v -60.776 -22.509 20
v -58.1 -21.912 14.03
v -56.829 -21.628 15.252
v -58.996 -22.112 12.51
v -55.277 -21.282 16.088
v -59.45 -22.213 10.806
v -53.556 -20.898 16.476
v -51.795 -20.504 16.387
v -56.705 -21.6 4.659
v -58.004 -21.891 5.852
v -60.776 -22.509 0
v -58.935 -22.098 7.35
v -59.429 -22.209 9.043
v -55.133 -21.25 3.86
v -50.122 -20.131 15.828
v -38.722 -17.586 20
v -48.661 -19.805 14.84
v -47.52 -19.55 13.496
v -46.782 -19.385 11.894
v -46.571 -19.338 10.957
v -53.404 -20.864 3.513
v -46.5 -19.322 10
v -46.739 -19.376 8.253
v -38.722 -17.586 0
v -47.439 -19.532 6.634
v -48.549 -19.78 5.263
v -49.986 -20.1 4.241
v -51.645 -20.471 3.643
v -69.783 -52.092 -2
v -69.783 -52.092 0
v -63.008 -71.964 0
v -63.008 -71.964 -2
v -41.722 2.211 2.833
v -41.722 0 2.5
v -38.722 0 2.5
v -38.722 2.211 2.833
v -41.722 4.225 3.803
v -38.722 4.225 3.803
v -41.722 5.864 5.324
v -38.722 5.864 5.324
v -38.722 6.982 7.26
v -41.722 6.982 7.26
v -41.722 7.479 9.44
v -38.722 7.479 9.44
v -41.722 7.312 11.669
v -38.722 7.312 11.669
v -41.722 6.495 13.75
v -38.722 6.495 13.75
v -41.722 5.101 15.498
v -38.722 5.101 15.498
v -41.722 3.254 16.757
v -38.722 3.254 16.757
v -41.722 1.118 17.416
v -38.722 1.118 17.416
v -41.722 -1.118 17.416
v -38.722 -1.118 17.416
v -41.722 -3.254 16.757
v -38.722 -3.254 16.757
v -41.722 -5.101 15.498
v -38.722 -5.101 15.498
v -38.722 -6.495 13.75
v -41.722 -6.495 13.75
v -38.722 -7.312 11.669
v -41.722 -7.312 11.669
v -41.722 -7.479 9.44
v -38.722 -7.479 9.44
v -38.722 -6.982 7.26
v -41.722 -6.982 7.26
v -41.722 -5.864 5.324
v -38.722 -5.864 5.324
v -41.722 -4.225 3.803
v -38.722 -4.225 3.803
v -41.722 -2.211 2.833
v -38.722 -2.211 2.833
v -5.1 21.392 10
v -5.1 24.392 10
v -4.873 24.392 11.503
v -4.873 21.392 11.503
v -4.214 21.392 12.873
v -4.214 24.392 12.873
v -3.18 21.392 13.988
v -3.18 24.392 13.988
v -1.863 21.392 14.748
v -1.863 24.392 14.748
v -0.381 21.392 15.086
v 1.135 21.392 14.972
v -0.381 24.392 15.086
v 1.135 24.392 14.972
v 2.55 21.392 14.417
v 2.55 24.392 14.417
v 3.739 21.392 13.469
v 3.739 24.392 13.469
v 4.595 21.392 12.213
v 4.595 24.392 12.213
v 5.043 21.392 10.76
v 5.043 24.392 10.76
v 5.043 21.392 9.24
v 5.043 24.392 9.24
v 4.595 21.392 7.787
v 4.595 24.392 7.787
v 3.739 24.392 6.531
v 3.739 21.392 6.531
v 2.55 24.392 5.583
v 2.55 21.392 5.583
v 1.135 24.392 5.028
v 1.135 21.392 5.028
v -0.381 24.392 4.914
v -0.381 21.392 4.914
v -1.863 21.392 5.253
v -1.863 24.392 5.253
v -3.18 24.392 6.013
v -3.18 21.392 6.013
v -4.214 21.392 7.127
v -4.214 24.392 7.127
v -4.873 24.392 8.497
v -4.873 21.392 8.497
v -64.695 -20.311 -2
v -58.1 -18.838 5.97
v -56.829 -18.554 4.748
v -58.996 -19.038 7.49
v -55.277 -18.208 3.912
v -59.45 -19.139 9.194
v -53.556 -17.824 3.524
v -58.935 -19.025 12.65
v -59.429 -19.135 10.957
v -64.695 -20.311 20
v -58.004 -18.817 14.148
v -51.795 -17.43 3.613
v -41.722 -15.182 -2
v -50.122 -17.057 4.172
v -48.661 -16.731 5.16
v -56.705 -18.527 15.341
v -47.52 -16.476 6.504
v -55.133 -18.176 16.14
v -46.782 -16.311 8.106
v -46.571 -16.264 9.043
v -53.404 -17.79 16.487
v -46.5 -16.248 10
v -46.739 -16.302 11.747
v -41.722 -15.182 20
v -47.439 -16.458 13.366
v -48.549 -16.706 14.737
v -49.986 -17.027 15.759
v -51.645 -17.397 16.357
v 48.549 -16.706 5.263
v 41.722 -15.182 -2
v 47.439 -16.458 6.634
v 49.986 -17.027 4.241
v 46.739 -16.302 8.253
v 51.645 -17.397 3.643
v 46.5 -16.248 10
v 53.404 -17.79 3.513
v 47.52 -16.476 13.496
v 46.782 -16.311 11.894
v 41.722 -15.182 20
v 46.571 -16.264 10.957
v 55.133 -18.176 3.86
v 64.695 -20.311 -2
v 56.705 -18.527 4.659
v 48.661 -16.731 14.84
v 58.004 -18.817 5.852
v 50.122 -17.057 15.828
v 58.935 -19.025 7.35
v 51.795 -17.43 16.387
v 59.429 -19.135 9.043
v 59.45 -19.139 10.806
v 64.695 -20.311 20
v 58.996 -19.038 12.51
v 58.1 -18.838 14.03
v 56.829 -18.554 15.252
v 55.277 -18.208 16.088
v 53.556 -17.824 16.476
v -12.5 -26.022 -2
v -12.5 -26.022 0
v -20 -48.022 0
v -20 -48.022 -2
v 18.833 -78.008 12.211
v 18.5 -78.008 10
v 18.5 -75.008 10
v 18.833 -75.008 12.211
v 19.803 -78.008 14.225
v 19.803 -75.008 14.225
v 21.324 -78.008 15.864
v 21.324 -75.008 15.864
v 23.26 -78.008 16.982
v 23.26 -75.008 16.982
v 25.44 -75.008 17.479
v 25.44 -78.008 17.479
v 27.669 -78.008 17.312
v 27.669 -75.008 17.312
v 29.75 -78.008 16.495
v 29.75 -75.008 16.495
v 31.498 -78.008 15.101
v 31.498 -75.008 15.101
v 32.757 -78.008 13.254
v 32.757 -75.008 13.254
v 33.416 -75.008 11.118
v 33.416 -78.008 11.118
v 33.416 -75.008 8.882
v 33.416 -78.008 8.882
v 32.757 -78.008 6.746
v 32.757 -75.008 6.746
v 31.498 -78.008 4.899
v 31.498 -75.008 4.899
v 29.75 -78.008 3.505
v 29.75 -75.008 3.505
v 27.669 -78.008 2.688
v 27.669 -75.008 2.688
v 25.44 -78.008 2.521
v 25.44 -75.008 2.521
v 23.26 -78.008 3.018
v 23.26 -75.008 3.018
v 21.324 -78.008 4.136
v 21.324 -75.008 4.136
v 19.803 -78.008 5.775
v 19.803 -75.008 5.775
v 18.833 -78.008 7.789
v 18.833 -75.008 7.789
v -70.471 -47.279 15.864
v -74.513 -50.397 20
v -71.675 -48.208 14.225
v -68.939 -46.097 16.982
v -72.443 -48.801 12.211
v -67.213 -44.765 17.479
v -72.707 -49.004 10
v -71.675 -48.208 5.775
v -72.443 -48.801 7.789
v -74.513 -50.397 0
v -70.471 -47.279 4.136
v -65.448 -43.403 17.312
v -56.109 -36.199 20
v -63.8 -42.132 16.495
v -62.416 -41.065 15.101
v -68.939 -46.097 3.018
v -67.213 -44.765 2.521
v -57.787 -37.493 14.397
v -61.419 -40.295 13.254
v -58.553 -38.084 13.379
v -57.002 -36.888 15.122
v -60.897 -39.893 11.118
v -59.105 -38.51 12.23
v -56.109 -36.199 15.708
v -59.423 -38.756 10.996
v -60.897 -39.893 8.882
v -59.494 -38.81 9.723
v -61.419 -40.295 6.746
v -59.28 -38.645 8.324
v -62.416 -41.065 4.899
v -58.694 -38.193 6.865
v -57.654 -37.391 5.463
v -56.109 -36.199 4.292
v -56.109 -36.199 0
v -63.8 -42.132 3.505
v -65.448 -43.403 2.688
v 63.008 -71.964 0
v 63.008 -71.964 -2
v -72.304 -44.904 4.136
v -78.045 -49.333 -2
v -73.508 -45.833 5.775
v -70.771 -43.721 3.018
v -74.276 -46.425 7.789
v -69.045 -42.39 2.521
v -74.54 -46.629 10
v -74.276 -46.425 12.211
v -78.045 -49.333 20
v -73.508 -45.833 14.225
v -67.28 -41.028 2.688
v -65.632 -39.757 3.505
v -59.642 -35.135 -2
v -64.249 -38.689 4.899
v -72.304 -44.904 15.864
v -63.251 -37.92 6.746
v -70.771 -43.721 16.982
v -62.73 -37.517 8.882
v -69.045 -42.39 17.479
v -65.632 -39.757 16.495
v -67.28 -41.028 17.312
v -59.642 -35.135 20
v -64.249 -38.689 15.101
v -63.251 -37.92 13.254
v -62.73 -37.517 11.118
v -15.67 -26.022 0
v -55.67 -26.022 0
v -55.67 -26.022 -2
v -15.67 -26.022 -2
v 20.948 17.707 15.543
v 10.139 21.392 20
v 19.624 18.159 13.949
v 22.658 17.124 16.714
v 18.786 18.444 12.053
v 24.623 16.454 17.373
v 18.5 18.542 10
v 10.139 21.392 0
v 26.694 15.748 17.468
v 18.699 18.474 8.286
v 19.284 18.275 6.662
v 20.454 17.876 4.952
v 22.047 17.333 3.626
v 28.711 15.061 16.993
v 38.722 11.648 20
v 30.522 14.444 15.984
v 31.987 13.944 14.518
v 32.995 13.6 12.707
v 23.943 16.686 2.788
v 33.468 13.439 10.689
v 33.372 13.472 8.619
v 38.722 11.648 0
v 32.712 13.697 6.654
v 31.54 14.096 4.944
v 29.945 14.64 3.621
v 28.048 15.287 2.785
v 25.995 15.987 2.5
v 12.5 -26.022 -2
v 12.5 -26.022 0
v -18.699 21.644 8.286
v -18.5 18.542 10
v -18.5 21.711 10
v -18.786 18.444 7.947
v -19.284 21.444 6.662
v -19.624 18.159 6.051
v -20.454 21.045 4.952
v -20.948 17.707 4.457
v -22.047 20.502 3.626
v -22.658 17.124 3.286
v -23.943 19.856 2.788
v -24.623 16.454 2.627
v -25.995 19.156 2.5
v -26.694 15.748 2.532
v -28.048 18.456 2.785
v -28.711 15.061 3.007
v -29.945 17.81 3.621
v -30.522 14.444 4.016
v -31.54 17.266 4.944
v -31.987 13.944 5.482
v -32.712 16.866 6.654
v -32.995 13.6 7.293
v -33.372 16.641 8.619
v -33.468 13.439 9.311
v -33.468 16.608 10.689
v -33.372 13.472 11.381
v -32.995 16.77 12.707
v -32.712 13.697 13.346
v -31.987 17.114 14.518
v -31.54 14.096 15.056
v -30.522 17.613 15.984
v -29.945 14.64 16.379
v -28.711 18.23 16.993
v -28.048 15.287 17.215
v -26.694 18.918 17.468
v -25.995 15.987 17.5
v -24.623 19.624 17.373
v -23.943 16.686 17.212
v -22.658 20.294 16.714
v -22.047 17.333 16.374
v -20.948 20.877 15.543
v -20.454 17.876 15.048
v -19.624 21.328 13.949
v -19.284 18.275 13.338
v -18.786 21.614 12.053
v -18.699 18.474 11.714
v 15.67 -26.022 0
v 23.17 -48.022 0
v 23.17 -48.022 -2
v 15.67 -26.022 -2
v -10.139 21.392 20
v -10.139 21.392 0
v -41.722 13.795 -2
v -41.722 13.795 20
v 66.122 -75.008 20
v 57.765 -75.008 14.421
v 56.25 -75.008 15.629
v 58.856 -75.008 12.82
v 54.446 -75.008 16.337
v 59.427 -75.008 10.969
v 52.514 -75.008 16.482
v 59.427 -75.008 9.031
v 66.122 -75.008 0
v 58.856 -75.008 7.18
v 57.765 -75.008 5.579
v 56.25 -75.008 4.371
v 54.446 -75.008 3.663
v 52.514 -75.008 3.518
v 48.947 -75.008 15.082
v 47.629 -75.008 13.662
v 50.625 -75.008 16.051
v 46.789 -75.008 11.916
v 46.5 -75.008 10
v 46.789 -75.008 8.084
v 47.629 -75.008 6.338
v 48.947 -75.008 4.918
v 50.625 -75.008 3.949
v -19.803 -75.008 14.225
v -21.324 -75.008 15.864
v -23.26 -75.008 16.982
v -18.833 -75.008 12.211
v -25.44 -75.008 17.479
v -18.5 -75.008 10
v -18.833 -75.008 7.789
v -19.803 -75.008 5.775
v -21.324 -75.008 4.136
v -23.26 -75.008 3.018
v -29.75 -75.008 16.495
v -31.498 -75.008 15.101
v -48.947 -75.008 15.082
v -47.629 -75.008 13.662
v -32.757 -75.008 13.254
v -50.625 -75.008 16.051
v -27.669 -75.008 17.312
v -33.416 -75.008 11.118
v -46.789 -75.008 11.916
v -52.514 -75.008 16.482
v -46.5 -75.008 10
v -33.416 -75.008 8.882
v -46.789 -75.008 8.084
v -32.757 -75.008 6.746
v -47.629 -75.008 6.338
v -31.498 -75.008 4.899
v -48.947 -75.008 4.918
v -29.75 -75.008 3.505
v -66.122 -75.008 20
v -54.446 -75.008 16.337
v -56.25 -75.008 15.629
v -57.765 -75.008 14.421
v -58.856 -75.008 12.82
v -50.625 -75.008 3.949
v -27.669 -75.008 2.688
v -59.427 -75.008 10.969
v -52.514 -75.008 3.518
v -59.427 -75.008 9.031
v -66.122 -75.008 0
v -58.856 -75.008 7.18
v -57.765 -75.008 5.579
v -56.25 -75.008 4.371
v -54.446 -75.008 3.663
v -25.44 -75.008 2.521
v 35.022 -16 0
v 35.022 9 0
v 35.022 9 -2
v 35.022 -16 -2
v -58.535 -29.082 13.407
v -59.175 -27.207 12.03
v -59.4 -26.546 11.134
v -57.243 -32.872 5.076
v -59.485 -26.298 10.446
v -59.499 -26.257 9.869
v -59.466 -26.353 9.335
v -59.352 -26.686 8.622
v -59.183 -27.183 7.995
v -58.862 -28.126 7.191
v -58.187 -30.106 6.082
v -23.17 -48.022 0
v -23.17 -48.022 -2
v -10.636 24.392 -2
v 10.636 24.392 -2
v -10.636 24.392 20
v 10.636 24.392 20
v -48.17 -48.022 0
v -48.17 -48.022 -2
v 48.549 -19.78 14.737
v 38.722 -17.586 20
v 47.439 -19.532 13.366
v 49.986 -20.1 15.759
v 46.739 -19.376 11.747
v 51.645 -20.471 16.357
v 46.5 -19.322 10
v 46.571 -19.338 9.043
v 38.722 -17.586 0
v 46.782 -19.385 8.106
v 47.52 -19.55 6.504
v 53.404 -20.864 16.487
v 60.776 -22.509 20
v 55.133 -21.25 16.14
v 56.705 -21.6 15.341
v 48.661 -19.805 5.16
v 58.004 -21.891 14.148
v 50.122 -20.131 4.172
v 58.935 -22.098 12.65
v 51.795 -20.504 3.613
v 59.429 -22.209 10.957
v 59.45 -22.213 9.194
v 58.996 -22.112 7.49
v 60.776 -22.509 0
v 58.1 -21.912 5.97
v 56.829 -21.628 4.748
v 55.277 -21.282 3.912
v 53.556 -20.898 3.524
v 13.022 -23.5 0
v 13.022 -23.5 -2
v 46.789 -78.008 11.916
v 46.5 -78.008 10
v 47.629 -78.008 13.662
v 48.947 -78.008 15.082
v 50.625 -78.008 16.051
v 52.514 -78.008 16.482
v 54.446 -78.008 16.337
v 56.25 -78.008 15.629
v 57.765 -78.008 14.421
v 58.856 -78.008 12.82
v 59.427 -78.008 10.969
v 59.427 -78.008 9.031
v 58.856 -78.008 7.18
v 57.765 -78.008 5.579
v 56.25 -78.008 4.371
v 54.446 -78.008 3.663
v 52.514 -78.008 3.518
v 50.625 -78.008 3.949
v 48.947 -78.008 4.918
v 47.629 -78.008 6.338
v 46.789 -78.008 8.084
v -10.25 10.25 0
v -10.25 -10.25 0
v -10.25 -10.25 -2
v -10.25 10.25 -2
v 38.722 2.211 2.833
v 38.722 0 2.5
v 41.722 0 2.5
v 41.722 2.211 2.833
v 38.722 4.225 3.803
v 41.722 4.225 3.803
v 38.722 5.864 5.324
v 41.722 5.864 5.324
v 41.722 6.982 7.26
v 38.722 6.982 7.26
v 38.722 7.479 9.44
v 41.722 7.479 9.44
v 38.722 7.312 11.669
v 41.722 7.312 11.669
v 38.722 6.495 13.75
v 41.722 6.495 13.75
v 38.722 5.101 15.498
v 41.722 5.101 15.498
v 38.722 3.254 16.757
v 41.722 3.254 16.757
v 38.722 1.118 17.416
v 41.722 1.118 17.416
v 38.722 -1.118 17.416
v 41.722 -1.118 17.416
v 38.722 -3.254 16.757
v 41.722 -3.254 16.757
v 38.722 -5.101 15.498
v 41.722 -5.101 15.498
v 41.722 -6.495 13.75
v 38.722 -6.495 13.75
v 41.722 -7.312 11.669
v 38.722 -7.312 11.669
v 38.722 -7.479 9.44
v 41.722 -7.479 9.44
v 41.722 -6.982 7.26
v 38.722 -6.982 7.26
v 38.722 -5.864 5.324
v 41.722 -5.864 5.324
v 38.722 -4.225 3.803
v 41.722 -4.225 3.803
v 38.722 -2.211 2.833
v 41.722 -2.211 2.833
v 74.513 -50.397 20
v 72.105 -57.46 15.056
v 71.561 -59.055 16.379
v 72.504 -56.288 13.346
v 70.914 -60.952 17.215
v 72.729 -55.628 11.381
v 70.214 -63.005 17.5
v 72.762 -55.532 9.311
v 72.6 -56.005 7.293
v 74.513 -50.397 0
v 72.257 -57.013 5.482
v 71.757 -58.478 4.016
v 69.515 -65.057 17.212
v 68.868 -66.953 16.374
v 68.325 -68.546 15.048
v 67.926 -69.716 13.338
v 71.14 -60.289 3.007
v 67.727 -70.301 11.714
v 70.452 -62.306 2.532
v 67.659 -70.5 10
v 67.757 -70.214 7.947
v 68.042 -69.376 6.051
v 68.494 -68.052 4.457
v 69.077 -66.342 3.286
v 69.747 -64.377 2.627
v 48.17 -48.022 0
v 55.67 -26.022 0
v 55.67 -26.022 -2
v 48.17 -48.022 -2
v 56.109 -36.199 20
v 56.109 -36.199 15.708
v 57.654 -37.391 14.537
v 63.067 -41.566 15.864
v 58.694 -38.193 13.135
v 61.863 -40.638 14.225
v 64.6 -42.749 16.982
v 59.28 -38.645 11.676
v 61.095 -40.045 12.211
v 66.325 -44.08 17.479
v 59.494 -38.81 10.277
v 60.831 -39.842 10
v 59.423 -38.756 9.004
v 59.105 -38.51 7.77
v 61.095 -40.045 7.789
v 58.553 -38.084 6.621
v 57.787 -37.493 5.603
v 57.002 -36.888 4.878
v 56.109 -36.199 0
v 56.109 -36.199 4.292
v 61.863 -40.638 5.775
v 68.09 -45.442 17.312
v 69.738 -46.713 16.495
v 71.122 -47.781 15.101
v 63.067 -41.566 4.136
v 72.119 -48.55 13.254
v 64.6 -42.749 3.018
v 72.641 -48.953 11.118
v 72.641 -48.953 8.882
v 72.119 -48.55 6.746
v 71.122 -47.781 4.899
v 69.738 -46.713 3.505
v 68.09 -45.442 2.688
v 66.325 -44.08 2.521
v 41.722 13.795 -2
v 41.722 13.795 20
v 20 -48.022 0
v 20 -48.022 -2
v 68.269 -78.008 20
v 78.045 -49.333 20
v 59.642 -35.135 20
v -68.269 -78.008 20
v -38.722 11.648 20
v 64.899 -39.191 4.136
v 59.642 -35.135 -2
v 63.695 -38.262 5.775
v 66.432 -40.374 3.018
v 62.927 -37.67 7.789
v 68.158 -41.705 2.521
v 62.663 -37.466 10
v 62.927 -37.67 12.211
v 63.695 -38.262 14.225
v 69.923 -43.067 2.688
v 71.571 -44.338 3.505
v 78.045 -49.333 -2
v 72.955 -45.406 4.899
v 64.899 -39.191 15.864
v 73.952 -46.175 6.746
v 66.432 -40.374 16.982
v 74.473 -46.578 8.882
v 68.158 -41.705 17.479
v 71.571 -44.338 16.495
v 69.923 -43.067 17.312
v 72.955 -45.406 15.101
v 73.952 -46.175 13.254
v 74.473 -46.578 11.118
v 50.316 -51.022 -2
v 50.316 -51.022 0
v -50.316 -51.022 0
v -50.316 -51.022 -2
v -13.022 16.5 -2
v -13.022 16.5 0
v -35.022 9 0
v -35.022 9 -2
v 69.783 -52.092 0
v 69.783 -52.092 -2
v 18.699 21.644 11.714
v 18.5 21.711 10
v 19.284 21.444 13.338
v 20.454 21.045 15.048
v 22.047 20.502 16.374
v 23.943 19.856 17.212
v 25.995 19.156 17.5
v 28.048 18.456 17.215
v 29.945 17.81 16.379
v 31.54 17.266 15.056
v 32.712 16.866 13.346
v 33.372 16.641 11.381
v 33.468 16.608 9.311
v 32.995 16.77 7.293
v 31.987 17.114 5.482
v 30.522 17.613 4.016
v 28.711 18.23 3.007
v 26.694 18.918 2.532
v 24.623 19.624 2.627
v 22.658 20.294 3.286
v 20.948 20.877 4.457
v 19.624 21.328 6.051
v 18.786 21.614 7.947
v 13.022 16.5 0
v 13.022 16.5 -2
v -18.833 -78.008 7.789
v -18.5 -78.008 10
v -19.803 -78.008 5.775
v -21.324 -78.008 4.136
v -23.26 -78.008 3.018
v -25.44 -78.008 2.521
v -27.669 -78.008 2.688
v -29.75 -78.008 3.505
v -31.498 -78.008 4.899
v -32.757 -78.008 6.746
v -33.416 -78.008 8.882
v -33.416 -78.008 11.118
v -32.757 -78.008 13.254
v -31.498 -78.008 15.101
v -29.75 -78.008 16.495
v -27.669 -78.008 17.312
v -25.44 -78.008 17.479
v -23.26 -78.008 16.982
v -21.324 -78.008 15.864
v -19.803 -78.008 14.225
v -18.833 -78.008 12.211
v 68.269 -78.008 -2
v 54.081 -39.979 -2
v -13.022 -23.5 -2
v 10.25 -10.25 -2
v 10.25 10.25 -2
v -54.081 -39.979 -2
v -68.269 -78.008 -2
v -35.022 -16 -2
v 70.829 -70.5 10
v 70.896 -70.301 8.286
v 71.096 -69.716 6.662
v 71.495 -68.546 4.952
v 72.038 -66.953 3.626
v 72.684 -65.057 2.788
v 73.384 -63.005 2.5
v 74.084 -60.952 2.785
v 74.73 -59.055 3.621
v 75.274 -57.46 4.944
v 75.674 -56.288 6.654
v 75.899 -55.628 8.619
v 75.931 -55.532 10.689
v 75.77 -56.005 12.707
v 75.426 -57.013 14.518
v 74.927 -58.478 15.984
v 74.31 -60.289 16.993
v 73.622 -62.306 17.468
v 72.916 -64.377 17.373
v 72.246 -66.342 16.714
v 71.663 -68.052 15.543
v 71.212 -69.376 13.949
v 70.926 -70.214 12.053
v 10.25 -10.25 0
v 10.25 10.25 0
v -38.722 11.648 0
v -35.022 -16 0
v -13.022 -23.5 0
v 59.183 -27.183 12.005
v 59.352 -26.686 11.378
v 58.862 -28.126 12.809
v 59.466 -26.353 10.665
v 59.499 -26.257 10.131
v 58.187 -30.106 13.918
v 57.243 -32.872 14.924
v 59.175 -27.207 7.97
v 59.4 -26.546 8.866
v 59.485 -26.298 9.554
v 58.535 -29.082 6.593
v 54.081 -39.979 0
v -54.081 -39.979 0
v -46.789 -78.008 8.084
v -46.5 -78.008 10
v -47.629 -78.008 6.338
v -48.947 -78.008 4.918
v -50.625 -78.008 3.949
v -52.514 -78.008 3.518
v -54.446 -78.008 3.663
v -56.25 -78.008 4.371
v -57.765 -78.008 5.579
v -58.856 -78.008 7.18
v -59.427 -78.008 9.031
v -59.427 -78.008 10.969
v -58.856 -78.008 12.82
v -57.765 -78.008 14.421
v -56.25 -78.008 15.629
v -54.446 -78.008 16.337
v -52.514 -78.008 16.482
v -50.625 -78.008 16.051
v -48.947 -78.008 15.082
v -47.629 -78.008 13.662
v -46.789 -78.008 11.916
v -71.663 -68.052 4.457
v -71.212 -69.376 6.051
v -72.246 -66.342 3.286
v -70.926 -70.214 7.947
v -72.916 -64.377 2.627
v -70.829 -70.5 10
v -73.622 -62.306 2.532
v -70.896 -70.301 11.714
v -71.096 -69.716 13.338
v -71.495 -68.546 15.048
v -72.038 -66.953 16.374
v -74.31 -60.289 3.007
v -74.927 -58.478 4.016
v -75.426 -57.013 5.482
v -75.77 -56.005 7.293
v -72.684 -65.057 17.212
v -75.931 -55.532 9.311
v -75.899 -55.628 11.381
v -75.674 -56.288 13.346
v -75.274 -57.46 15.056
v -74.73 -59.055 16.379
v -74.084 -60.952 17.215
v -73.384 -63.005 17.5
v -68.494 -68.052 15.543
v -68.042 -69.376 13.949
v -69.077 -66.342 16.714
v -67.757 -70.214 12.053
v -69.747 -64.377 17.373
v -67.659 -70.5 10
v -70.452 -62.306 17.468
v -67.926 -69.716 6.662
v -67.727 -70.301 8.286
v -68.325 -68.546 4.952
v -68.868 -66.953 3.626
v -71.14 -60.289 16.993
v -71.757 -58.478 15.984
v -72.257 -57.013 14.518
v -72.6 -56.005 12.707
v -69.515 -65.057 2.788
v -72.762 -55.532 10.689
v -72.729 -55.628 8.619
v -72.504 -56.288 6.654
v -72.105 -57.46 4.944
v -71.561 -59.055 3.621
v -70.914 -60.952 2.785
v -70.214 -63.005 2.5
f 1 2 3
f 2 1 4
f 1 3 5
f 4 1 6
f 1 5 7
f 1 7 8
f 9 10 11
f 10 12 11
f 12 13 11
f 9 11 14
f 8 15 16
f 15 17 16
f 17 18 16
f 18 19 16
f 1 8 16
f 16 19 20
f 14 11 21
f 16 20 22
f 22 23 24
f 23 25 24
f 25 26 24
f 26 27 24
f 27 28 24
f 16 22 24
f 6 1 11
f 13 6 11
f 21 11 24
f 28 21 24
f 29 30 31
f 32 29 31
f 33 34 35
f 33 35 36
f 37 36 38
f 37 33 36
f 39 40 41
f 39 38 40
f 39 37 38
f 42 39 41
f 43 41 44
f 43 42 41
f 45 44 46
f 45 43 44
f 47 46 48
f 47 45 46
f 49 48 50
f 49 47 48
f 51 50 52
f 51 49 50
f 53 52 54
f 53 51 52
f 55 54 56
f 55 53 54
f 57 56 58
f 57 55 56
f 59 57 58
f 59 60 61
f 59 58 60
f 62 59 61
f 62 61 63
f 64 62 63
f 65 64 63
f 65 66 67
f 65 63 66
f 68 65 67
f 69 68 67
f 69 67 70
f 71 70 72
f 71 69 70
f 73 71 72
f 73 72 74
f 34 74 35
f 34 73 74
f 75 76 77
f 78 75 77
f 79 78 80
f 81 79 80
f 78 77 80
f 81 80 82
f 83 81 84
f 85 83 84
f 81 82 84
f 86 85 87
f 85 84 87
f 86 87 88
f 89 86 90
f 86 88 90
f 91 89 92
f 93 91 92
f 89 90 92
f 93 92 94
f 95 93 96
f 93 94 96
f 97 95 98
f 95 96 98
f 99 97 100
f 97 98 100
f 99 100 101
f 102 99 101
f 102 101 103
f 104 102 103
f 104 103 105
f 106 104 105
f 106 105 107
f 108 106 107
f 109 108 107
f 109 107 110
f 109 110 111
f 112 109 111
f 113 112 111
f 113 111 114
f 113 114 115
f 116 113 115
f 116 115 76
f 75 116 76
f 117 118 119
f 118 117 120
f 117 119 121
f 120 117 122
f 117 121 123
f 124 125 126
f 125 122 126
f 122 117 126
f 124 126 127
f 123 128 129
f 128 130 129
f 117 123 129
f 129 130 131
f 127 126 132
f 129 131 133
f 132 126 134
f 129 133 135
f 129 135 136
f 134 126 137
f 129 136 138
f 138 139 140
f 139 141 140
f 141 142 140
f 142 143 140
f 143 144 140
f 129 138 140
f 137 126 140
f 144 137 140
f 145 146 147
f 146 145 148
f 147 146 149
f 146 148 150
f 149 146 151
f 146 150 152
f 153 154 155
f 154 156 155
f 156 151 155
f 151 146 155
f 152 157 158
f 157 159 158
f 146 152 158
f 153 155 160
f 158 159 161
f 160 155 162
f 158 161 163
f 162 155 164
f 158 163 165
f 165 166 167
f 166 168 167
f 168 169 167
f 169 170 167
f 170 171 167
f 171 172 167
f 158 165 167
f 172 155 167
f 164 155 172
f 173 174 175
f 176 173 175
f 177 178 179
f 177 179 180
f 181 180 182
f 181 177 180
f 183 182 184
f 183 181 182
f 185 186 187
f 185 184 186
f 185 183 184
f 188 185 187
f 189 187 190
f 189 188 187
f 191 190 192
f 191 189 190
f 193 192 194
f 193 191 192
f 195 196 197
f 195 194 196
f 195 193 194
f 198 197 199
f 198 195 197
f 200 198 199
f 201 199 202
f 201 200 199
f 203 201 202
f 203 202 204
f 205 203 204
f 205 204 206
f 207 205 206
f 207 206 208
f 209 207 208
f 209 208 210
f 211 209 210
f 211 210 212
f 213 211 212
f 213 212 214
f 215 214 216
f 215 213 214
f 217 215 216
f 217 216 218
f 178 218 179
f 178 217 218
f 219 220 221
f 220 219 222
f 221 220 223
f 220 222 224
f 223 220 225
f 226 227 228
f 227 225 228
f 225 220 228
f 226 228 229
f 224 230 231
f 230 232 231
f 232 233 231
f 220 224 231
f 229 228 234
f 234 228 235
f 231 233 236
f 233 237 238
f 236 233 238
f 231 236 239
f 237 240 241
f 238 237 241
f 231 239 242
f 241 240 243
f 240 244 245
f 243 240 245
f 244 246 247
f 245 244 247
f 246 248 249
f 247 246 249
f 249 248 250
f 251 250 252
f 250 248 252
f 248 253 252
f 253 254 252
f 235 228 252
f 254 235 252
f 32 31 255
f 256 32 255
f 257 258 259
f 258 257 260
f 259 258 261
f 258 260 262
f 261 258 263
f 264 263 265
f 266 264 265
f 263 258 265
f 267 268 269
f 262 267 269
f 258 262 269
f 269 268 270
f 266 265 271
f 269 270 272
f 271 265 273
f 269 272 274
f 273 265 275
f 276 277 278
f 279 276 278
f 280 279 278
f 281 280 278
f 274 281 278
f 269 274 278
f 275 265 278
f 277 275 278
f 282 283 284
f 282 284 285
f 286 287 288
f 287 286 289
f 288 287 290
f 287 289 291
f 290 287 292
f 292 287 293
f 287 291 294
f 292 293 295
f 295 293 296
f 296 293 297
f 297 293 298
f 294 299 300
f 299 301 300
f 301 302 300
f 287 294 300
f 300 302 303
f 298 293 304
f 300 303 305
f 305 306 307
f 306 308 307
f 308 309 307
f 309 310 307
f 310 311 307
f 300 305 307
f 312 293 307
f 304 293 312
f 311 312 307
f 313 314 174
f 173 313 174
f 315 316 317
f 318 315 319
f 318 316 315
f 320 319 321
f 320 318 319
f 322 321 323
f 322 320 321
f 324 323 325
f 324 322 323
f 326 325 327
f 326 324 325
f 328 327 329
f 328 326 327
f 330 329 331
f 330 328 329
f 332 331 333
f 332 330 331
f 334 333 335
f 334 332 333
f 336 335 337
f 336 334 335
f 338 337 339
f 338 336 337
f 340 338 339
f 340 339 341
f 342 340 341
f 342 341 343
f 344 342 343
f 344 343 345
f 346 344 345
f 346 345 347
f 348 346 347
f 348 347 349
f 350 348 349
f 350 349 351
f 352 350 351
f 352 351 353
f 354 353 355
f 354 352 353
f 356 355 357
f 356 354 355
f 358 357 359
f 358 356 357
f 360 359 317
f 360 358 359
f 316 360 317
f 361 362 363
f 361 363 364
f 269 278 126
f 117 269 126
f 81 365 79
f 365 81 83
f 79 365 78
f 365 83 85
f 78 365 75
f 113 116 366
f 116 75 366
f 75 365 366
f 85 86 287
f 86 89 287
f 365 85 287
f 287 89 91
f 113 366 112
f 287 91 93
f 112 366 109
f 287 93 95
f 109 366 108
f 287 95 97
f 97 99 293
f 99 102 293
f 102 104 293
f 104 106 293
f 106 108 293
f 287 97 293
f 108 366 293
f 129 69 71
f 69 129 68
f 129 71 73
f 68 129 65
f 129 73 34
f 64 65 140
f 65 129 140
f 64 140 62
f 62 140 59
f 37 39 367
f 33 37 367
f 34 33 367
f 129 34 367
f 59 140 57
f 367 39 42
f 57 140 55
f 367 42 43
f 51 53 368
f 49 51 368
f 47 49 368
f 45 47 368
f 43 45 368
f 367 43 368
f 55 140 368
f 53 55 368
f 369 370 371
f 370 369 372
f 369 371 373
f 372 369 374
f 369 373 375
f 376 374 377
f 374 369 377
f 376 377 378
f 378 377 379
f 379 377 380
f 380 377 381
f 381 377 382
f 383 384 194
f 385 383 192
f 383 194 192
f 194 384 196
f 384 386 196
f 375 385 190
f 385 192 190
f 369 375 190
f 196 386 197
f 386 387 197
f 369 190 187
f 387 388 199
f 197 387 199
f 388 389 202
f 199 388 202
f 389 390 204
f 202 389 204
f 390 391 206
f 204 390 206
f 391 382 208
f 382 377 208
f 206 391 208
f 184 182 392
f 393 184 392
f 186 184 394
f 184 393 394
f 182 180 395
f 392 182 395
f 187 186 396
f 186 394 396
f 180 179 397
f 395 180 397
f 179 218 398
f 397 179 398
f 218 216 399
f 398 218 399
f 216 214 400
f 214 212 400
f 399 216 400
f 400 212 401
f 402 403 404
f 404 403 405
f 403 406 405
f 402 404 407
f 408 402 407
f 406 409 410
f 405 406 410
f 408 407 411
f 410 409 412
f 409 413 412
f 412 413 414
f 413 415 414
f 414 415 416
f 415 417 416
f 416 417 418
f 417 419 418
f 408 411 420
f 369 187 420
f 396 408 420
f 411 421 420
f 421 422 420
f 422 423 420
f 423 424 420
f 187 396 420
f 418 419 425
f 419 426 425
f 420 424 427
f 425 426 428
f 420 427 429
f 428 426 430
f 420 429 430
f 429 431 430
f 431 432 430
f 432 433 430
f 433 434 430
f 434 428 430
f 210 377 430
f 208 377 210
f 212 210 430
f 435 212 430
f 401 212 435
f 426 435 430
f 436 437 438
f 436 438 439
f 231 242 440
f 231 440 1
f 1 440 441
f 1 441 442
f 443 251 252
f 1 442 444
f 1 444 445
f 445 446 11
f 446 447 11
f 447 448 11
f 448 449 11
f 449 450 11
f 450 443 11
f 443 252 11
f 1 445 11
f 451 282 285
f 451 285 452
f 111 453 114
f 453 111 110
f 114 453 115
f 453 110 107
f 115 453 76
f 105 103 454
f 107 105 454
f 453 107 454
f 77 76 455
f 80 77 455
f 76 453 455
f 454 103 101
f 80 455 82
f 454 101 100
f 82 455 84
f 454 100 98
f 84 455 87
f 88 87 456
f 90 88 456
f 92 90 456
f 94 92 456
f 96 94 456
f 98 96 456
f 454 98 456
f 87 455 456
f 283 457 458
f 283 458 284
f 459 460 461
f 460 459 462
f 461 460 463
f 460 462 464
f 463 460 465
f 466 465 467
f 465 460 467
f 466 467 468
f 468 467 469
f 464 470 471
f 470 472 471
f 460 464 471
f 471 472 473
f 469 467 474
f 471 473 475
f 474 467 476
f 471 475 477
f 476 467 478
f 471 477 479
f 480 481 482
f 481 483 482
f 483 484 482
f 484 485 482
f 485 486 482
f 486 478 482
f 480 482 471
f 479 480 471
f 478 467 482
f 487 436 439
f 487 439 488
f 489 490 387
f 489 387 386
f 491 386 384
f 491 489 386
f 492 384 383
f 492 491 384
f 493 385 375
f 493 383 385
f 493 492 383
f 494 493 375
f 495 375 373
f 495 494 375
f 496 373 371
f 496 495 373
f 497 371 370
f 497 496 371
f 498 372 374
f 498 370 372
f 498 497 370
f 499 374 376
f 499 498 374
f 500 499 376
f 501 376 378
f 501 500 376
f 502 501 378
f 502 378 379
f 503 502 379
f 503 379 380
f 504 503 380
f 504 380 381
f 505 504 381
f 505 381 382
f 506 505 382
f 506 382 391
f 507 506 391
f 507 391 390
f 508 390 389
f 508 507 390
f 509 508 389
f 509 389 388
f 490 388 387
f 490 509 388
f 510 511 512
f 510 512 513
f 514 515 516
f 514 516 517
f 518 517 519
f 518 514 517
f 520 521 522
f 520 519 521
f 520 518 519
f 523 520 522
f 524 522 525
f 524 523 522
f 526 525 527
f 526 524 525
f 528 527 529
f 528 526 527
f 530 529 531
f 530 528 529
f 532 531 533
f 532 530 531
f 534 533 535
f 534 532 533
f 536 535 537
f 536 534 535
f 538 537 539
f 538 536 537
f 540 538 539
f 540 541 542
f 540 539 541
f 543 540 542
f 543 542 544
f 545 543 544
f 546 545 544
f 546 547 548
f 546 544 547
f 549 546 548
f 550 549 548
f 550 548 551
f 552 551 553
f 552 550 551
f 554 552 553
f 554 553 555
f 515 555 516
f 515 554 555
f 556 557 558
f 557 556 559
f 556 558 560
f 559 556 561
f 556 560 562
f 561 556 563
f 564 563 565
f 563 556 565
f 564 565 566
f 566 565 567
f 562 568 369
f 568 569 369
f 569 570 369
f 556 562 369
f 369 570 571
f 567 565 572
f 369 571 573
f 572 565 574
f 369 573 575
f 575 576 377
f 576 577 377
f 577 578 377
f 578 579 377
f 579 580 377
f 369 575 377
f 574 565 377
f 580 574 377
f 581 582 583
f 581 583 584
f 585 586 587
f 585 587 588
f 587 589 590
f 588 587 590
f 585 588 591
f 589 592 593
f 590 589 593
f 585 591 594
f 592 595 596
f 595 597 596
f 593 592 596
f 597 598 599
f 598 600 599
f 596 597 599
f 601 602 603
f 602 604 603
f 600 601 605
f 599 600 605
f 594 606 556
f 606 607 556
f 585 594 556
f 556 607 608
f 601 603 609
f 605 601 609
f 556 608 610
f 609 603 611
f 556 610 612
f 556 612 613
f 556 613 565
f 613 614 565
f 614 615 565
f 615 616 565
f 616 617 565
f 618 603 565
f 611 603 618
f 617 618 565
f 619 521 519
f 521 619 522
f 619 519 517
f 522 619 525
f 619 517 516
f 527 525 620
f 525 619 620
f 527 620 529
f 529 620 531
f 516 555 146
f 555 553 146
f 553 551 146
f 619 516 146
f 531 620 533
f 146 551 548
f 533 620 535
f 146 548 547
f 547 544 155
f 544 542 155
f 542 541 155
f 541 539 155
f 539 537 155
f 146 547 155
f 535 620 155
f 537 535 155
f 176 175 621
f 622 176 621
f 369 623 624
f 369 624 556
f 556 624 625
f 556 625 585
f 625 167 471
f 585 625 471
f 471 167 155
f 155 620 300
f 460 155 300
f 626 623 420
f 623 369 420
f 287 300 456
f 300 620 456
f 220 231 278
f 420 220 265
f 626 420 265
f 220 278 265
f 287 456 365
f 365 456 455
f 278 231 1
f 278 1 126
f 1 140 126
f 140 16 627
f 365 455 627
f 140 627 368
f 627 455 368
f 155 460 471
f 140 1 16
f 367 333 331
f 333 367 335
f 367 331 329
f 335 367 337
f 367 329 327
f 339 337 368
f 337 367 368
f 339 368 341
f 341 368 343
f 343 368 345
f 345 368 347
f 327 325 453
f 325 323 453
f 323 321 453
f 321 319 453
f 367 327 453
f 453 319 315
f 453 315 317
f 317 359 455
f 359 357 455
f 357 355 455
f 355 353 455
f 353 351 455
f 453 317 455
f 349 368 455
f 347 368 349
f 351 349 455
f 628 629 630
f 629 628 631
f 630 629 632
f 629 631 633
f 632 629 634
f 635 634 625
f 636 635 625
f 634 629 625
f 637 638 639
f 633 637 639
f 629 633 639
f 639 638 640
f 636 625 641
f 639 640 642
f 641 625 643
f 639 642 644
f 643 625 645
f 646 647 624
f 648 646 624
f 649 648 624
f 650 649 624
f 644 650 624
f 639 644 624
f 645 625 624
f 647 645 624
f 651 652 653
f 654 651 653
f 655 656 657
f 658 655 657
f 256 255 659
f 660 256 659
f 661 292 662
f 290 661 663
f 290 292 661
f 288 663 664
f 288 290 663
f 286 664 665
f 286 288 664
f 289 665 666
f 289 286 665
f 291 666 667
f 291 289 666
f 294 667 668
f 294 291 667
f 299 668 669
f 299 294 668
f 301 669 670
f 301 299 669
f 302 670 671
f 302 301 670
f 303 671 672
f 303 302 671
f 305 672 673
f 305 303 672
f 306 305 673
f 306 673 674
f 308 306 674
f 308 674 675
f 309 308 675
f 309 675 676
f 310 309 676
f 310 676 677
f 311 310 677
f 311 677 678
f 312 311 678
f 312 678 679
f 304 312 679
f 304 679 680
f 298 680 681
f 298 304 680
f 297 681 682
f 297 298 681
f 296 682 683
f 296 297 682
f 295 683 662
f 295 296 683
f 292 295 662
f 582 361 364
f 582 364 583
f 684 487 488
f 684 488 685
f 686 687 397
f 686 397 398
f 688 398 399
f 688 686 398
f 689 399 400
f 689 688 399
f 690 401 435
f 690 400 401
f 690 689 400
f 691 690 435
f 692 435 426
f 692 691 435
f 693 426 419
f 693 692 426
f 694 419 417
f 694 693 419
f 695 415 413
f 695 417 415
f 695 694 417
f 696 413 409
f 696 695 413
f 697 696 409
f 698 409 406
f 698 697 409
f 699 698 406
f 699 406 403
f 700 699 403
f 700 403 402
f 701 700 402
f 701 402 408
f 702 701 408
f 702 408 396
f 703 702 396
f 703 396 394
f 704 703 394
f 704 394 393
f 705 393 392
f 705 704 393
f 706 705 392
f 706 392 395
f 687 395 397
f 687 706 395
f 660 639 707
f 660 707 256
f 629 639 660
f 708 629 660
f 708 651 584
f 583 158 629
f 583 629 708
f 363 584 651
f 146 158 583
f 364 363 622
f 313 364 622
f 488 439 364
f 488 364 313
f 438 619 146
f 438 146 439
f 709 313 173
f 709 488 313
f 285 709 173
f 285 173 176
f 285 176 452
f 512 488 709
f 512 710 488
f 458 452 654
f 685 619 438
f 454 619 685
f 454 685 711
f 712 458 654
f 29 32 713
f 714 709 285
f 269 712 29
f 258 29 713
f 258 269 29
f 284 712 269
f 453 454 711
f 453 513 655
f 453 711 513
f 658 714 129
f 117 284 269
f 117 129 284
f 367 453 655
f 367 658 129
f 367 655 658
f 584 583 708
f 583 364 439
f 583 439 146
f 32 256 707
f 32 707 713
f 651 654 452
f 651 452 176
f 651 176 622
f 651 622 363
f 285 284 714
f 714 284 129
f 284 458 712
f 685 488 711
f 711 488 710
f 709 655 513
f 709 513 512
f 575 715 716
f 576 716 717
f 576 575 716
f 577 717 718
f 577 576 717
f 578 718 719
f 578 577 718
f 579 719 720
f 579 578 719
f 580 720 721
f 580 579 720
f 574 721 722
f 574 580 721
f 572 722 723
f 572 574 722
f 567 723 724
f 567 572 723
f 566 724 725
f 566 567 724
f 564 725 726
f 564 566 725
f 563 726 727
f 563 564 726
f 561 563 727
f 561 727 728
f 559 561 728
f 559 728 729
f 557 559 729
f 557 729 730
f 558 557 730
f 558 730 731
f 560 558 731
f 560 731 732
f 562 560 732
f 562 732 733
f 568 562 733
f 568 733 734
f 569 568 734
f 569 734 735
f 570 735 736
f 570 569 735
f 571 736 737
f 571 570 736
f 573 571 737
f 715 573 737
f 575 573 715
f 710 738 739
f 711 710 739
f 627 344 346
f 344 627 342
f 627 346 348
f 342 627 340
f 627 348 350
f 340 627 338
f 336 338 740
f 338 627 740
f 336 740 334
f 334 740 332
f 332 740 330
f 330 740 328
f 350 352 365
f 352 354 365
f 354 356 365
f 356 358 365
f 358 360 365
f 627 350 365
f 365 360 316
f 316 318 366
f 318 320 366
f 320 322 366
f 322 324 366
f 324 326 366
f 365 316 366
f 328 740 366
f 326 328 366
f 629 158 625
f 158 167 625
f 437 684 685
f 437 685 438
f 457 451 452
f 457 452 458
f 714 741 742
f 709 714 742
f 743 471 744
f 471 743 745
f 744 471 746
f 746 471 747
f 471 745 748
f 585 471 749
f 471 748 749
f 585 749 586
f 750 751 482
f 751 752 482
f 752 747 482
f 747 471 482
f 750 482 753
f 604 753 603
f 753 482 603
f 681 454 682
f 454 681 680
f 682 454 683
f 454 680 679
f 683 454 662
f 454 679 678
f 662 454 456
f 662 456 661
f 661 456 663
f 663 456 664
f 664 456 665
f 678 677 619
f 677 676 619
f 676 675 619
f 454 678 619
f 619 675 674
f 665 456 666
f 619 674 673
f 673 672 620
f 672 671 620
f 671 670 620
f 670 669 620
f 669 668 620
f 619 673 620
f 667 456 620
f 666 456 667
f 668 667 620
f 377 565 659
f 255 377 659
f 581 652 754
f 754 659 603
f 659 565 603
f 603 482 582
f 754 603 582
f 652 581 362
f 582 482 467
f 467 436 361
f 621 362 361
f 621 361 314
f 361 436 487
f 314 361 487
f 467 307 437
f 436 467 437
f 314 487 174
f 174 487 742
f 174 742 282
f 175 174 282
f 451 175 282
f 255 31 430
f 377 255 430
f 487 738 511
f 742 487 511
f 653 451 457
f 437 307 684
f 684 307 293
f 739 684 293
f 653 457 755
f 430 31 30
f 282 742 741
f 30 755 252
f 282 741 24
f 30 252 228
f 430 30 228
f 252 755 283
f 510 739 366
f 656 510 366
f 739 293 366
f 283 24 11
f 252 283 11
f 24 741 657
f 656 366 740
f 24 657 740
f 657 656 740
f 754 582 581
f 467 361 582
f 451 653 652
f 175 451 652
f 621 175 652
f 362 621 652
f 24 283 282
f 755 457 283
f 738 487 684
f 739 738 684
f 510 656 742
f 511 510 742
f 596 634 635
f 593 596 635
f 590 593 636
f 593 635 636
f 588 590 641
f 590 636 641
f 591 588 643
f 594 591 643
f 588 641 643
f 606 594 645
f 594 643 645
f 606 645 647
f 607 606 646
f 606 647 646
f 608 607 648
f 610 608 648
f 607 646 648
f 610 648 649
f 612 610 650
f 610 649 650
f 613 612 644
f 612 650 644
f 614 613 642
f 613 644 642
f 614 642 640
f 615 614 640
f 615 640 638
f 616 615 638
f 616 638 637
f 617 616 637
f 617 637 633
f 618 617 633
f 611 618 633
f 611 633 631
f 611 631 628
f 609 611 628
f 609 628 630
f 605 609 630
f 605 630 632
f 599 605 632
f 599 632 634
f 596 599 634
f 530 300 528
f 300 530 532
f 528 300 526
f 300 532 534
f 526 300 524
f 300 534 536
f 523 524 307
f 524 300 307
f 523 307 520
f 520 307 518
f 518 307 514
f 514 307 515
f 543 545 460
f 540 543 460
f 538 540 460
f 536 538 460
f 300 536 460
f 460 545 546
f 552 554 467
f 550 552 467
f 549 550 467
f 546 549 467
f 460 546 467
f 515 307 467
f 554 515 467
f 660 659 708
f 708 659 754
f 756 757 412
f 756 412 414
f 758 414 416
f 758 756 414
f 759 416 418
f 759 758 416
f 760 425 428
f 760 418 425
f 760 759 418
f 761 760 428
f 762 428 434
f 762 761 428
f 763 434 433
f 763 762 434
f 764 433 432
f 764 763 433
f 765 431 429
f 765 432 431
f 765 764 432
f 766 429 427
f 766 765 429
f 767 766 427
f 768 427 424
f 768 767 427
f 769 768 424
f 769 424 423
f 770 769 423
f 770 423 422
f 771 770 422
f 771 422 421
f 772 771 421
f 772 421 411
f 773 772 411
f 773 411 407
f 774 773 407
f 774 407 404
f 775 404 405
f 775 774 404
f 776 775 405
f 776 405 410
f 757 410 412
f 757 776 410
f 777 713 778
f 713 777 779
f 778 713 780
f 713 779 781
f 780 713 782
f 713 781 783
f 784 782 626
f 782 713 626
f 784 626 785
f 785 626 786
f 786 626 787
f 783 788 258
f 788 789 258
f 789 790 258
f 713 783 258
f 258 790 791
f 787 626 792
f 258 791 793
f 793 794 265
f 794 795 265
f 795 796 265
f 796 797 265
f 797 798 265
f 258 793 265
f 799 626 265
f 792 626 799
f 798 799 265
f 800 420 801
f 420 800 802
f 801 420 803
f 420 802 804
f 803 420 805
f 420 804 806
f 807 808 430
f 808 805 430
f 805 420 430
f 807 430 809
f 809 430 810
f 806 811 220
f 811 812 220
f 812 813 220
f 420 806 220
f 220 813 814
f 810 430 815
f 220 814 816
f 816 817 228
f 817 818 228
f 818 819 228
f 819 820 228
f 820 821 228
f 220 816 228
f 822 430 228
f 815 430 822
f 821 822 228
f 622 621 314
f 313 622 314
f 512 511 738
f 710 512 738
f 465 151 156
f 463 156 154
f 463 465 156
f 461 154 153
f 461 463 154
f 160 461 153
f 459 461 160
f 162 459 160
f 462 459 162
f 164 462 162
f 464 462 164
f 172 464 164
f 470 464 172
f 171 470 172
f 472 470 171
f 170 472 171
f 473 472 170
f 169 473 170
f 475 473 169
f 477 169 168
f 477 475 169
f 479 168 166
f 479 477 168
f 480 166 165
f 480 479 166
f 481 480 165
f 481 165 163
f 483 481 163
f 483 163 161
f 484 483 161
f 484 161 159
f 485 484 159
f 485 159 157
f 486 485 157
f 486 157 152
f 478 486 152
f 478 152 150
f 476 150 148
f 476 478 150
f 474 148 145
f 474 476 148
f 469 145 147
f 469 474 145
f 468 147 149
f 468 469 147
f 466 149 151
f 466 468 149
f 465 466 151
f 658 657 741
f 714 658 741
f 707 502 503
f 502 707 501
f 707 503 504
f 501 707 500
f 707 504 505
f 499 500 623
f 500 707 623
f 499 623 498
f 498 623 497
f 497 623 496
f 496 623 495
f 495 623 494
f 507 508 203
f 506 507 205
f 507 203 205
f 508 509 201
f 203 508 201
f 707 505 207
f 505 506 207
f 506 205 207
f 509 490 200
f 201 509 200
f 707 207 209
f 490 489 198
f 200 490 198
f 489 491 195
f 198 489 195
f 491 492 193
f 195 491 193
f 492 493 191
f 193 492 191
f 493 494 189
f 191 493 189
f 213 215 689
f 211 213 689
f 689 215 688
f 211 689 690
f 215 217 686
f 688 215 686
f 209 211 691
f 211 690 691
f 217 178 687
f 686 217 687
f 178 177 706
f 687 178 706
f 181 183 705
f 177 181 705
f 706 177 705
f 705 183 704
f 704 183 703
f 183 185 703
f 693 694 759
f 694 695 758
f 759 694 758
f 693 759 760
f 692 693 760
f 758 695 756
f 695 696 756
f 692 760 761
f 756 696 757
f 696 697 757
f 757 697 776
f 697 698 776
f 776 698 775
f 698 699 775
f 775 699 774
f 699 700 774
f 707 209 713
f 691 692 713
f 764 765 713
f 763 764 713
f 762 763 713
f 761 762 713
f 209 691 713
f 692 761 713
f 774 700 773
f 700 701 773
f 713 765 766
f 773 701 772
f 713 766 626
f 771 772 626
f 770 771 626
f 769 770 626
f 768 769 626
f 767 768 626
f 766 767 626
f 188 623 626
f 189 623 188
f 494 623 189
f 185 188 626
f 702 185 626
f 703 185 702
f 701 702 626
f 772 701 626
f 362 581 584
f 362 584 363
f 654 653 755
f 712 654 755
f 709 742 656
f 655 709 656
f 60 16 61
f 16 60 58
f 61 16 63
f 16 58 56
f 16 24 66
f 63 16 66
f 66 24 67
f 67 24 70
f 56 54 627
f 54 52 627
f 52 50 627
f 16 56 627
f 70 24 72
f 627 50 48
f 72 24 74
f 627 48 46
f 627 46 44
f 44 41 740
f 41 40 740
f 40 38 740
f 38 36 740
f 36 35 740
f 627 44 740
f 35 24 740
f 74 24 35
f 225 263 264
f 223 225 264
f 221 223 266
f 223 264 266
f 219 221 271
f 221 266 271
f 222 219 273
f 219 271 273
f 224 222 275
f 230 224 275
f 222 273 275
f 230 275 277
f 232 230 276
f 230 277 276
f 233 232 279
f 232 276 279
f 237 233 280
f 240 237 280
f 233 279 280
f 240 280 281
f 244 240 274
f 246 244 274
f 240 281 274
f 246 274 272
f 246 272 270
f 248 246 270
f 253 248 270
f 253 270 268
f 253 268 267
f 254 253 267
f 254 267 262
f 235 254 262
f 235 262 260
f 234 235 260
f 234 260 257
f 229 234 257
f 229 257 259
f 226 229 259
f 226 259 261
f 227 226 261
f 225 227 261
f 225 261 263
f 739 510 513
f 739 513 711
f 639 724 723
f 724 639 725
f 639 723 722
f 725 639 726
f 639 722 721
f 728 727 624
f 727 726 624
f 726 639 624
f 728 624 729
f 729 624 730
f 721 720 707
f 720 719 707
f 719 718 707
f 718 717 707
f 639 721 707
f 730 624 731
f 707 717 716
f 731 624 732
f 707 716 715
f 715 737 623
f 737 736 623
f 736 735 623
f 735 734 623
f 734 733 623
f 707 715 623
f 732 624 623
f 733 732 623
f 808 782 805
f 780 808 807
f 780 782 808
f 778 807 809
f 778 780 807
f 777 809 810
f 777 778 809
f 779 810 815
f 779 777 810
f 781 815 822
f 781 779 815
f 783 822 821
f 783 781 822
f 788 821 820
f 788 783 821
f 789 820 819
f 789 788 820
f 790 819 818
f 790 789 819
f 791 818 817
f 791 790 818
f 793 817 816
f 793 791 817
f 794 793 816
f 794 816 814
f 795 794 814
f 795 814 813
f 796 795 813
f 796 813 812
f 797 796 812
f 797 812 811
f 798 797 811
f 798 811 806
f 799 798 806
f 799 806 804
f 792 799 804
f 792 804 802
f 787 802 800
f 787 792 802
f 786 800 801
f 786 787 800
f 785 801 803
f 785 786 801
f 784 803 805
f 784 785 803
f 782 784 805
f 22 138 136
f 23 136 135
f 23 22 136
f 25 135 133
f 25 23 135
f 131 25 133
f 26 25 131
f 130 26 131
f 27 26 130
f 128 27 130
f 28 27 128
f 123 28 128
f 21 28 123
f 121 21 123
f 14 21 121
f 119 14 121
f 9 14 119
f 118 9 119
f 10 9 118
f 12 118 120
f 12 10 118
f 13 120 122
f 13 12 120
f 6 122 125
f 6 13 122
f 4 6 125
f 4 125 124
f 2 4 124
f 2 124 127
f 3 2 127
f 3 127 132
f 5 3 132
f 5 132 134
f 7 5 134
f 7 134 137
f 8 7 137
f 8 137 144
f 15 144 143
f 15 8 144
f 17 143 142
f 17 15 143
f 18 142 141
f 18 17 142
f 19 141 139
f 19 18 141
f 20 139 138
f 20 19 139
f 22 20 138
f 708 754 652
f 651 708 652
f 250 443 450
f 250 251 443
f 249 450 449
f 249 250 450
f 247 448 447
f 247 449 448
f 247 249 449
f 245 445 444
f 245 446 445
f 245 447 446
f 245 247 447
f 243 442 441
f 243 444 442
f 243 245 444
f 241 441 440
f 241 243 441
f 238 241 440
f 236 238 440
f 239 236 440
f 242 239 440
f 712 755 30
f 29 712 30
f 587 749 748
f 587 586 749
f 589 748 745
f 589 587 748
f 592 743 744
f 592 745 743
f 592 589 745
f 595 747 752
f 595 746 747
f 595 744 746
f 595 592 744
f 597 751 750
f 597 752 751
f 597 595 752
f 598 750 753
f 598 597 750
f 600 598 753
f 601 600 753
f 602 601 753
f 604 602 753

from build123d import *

# Parameters (mm, degrees)
EXTRUDE_THIN3_DEPTH     = 20
SKETCH5_W               = 20.5
SKETCH5_H               = 20.5
BOSS_EXTRUDE2_DEPTH     = 2
SKETCH6_R               = 5.1
CUT_EXTRUDE1_DEPTH      = 5
CUT_EXTRUDE2_DEPTH      = 113.143625411
CUT_EXTRUDE2_DEPTH_BACK = 113.143625411
SKETCH7_R               = 7.5
SKETCH7_R_2             = 6.5
CUT_EXTRUDE3_DEPTH      = 113.143625411
CUT_EXTRUDE3_DEPTH_BACK = 113.143625411
SKETCH8_R               = 7.5
SKETCH9_R               = 7.5
CUT_EXTRUDE4_DEPTH      = 5
SKETCH10_R              = 7.5
CUT_EXTRUDE5_DEPTH      = 5


with BuildPart() as part:
    # Sketch4 → Extrude-Thin3 (new body)
    with BuildSketch(Plane.XY):
        Polygon((68.26921232, -78.007734737), (-68.26921232, -78.007734737), (-78.04476947, -49.332767098), (-59.641599788, -35.135114275), (-64.69543331, -20.310535944), (-41.7225, -15.181760387), (-41.7225, 13.794543937), (-10.635850775, 24.392265263), (10.635850775, 24.392265263), (41.7225, 13.794543937), (41.7225, -15.181760387), (64.69543331, -20.310535944), (59.641599788, -35.135114275), (78.04476947, -49.332767098), align=None)
        Polygon((66.122401602, -75.007734737), (-66.122401602, -75.007734737), (-74.512519059, -50.396723531), (-56.109349377, -36.199070708), (-60.776273805, -22.509425719), (-38.7225, -17.58585525), (-38.7225, 11.647733219), (-10.138539336, 21.392265263), (10.138539336, 21.392265263), (38.7225, 11.647733219), (38.7225, -17.58585525), (60.776273805, -22.509425719), (56.109349377, -36.199070708), (74.512519059, -50.396723531), align=None, mode=Mode.SUBTRACT)
    extrude(amount=EXTRUDE_THIN3_DEPTH)

    # Sketch5 → Boss-Extrude2 (add)
    with BuildSketch(Plane.XY):
        Polygon((10.635850775, 24.392265263), (41.7225, 13.794543937), (41.7225, -15.181760387), (64.69543331, -20.310535944), (59.641599788, -35.135114275), (78.04476947, -49.332767098), (68.26921232, -78.007734737), (-68.26921232, -78.007734737), (-78.04476947, -49.332767098), (-59.641599788, -35.135114275), (-64.69543331, -20.310535944), (-41.7225, -15.181760387), (-41.7225, 13.794543937), (-10.635850775, 24.392265263), align=None)
        Rectangle(SKETCH5_W, SKETCH5_H, mode=Mode.SUBTRACT)
        Polygon((55.669537991, -26.0225), (48.169537991, -48.0225), (23.169537991, -48.0225), (15.669537991, -26.0225), align=None, mode=Mode.SUBTRACT)
        Polygon((-20, -48.0225), (20, -48.0225), (12.5, -26.0225), (-12.5, -26.0225), align=None, mode=Mode.SUBTRACT)
        Polygon((-15.669537991, -26.0225), (-23.169537991, -48.0225), (-48.169537991, -48.0225), (-55.669537991, -26.0225), align=None, mode=Mode.SUBTRACT)
        Polygon((13.0225, 16.5), (35.0225, 9), (35.0225, -16), (13.0225, -23.5), align=None, mode=Mode.SUBTRACT)
        Polygon((-35.0225, -16), (-13.0225, -23.5), (-13.0225, 16.5), (-35.0225, 9), align=None, mode=Mode.SUBTRACT)
        Polygon((-54.081215036, -39.978892106), (-69.782858952, -52.092375431), (-63.008353643, -71.964257668), (63.008353643, -71.964257668), (69.782858952, -52.092375431), (54.081215036, -39.978892106), (50.316348709, -51.0225), (-50.316348709, -51.0225), align=None, mode=Mode.SUBTRACT)
    extrude(amount=-BOSS_EXTRUDE2_DEPTH)

    # Sketch6 → Cut-Extrude1 (cut)
    with BuildSketch(Plane(origin=(0, 24.392265263, 0), x_dir=(1, 0, 0), z_dir=(0, 1, 0))):
        with Locations(Location((0, -10.000182073, 0), (0, 0, 180))):
            Circle(SKETCH6_R)
    extrude(amount=-CUT_EXTRUDE1_DEPTH, mode=Mode.SUBTRACT)

    # Sketch7 → Cut-Extrude2 (cut, two sides: drawn at the far end of the back side and taken through both)
    with BuildSketch(Plane(origin=(0, 0, 0), x_dir=(1, 0, 0), z_dir=(0, 1, 0)).offset(-CUT_EXTRUDE2_DEPTH_BACK)):
        with Locations((-26, -10)):
            Circle(SKETCH7_R)
        with Locations((-53, -10)):
            Circle(SKETCH7_R_2)
        with Locations(Location((26, -10, 0), (0, 0, 180))):
            Circle(SKETCH7_R)
        with Locations(Location((53, -10, 0), (0, 0, 180))):
            Circle(SKETCH7_R_2)
    extrude(amount=CUT_EXTRUDE2_DEPTH + CUT_EXTRUDE2_DEPTH_BACK, mode=Mode.SUBTRACT)

    # Sketch8 → Cut-Extrude3 (cut, two sides: drawn at the far end of the back side and taken through both)
    with BuildSketch(Plane(origin=(0, 0, 0), x_dir=(0, 0, -1), z_dir=(1, 0, 0)).offset(-CUT_EXTRUDE3_DEPTH_BACK)):
        with Locations((-10, 0)):
            Circle(SKETCH8_R)
        with Locations(Location((-10, -63, 0), (0, 0, 270))):
            Circle(SKETCH8_R)
    extrude(amount=CUT_EXTRUDE3_DEPTH + CUT_EXTRUDE3_DEPTH_BACK, mode=Mode.SUBTRACT)

    # Sketch9 → Cut-Extrude4 (cut)
    with BuildSketch(Plane(origin=(5.260509798, 6.818736564, 0), x_dir=(0.7917630726515511, -0.6108283202221183, 0), z_dir=(0.6108283202221182, 0.791763072651551, 0))):
        with Locations(Location((80, -10, 0), (0, 0, 180))):
            Circle(SKETCH9_R)
    extrude(amount=-CUT_EXTRUDE4_DEPTH, mode=Mode.SUBTRACT)

    # Sketch10 → Cut-Extrude5 (cut)
    with BuildSketch(Plane(origin=(-5.260509798, 6.818736564, 0), x_dir=(0.7917630726515507, 0.6108283202221189, 0), z_dir=(-0.6108283202221189, 0.7917630726515507, 0))):
        with Locations(Location((-80, -10, 0), (0, 0, 180))):
            Circle(SKETCH10_R)
    extrude(amount=-CUT_EXTRUDE5_DEPTH, mode=Mode.SUBTRACT)


solid = part.part
